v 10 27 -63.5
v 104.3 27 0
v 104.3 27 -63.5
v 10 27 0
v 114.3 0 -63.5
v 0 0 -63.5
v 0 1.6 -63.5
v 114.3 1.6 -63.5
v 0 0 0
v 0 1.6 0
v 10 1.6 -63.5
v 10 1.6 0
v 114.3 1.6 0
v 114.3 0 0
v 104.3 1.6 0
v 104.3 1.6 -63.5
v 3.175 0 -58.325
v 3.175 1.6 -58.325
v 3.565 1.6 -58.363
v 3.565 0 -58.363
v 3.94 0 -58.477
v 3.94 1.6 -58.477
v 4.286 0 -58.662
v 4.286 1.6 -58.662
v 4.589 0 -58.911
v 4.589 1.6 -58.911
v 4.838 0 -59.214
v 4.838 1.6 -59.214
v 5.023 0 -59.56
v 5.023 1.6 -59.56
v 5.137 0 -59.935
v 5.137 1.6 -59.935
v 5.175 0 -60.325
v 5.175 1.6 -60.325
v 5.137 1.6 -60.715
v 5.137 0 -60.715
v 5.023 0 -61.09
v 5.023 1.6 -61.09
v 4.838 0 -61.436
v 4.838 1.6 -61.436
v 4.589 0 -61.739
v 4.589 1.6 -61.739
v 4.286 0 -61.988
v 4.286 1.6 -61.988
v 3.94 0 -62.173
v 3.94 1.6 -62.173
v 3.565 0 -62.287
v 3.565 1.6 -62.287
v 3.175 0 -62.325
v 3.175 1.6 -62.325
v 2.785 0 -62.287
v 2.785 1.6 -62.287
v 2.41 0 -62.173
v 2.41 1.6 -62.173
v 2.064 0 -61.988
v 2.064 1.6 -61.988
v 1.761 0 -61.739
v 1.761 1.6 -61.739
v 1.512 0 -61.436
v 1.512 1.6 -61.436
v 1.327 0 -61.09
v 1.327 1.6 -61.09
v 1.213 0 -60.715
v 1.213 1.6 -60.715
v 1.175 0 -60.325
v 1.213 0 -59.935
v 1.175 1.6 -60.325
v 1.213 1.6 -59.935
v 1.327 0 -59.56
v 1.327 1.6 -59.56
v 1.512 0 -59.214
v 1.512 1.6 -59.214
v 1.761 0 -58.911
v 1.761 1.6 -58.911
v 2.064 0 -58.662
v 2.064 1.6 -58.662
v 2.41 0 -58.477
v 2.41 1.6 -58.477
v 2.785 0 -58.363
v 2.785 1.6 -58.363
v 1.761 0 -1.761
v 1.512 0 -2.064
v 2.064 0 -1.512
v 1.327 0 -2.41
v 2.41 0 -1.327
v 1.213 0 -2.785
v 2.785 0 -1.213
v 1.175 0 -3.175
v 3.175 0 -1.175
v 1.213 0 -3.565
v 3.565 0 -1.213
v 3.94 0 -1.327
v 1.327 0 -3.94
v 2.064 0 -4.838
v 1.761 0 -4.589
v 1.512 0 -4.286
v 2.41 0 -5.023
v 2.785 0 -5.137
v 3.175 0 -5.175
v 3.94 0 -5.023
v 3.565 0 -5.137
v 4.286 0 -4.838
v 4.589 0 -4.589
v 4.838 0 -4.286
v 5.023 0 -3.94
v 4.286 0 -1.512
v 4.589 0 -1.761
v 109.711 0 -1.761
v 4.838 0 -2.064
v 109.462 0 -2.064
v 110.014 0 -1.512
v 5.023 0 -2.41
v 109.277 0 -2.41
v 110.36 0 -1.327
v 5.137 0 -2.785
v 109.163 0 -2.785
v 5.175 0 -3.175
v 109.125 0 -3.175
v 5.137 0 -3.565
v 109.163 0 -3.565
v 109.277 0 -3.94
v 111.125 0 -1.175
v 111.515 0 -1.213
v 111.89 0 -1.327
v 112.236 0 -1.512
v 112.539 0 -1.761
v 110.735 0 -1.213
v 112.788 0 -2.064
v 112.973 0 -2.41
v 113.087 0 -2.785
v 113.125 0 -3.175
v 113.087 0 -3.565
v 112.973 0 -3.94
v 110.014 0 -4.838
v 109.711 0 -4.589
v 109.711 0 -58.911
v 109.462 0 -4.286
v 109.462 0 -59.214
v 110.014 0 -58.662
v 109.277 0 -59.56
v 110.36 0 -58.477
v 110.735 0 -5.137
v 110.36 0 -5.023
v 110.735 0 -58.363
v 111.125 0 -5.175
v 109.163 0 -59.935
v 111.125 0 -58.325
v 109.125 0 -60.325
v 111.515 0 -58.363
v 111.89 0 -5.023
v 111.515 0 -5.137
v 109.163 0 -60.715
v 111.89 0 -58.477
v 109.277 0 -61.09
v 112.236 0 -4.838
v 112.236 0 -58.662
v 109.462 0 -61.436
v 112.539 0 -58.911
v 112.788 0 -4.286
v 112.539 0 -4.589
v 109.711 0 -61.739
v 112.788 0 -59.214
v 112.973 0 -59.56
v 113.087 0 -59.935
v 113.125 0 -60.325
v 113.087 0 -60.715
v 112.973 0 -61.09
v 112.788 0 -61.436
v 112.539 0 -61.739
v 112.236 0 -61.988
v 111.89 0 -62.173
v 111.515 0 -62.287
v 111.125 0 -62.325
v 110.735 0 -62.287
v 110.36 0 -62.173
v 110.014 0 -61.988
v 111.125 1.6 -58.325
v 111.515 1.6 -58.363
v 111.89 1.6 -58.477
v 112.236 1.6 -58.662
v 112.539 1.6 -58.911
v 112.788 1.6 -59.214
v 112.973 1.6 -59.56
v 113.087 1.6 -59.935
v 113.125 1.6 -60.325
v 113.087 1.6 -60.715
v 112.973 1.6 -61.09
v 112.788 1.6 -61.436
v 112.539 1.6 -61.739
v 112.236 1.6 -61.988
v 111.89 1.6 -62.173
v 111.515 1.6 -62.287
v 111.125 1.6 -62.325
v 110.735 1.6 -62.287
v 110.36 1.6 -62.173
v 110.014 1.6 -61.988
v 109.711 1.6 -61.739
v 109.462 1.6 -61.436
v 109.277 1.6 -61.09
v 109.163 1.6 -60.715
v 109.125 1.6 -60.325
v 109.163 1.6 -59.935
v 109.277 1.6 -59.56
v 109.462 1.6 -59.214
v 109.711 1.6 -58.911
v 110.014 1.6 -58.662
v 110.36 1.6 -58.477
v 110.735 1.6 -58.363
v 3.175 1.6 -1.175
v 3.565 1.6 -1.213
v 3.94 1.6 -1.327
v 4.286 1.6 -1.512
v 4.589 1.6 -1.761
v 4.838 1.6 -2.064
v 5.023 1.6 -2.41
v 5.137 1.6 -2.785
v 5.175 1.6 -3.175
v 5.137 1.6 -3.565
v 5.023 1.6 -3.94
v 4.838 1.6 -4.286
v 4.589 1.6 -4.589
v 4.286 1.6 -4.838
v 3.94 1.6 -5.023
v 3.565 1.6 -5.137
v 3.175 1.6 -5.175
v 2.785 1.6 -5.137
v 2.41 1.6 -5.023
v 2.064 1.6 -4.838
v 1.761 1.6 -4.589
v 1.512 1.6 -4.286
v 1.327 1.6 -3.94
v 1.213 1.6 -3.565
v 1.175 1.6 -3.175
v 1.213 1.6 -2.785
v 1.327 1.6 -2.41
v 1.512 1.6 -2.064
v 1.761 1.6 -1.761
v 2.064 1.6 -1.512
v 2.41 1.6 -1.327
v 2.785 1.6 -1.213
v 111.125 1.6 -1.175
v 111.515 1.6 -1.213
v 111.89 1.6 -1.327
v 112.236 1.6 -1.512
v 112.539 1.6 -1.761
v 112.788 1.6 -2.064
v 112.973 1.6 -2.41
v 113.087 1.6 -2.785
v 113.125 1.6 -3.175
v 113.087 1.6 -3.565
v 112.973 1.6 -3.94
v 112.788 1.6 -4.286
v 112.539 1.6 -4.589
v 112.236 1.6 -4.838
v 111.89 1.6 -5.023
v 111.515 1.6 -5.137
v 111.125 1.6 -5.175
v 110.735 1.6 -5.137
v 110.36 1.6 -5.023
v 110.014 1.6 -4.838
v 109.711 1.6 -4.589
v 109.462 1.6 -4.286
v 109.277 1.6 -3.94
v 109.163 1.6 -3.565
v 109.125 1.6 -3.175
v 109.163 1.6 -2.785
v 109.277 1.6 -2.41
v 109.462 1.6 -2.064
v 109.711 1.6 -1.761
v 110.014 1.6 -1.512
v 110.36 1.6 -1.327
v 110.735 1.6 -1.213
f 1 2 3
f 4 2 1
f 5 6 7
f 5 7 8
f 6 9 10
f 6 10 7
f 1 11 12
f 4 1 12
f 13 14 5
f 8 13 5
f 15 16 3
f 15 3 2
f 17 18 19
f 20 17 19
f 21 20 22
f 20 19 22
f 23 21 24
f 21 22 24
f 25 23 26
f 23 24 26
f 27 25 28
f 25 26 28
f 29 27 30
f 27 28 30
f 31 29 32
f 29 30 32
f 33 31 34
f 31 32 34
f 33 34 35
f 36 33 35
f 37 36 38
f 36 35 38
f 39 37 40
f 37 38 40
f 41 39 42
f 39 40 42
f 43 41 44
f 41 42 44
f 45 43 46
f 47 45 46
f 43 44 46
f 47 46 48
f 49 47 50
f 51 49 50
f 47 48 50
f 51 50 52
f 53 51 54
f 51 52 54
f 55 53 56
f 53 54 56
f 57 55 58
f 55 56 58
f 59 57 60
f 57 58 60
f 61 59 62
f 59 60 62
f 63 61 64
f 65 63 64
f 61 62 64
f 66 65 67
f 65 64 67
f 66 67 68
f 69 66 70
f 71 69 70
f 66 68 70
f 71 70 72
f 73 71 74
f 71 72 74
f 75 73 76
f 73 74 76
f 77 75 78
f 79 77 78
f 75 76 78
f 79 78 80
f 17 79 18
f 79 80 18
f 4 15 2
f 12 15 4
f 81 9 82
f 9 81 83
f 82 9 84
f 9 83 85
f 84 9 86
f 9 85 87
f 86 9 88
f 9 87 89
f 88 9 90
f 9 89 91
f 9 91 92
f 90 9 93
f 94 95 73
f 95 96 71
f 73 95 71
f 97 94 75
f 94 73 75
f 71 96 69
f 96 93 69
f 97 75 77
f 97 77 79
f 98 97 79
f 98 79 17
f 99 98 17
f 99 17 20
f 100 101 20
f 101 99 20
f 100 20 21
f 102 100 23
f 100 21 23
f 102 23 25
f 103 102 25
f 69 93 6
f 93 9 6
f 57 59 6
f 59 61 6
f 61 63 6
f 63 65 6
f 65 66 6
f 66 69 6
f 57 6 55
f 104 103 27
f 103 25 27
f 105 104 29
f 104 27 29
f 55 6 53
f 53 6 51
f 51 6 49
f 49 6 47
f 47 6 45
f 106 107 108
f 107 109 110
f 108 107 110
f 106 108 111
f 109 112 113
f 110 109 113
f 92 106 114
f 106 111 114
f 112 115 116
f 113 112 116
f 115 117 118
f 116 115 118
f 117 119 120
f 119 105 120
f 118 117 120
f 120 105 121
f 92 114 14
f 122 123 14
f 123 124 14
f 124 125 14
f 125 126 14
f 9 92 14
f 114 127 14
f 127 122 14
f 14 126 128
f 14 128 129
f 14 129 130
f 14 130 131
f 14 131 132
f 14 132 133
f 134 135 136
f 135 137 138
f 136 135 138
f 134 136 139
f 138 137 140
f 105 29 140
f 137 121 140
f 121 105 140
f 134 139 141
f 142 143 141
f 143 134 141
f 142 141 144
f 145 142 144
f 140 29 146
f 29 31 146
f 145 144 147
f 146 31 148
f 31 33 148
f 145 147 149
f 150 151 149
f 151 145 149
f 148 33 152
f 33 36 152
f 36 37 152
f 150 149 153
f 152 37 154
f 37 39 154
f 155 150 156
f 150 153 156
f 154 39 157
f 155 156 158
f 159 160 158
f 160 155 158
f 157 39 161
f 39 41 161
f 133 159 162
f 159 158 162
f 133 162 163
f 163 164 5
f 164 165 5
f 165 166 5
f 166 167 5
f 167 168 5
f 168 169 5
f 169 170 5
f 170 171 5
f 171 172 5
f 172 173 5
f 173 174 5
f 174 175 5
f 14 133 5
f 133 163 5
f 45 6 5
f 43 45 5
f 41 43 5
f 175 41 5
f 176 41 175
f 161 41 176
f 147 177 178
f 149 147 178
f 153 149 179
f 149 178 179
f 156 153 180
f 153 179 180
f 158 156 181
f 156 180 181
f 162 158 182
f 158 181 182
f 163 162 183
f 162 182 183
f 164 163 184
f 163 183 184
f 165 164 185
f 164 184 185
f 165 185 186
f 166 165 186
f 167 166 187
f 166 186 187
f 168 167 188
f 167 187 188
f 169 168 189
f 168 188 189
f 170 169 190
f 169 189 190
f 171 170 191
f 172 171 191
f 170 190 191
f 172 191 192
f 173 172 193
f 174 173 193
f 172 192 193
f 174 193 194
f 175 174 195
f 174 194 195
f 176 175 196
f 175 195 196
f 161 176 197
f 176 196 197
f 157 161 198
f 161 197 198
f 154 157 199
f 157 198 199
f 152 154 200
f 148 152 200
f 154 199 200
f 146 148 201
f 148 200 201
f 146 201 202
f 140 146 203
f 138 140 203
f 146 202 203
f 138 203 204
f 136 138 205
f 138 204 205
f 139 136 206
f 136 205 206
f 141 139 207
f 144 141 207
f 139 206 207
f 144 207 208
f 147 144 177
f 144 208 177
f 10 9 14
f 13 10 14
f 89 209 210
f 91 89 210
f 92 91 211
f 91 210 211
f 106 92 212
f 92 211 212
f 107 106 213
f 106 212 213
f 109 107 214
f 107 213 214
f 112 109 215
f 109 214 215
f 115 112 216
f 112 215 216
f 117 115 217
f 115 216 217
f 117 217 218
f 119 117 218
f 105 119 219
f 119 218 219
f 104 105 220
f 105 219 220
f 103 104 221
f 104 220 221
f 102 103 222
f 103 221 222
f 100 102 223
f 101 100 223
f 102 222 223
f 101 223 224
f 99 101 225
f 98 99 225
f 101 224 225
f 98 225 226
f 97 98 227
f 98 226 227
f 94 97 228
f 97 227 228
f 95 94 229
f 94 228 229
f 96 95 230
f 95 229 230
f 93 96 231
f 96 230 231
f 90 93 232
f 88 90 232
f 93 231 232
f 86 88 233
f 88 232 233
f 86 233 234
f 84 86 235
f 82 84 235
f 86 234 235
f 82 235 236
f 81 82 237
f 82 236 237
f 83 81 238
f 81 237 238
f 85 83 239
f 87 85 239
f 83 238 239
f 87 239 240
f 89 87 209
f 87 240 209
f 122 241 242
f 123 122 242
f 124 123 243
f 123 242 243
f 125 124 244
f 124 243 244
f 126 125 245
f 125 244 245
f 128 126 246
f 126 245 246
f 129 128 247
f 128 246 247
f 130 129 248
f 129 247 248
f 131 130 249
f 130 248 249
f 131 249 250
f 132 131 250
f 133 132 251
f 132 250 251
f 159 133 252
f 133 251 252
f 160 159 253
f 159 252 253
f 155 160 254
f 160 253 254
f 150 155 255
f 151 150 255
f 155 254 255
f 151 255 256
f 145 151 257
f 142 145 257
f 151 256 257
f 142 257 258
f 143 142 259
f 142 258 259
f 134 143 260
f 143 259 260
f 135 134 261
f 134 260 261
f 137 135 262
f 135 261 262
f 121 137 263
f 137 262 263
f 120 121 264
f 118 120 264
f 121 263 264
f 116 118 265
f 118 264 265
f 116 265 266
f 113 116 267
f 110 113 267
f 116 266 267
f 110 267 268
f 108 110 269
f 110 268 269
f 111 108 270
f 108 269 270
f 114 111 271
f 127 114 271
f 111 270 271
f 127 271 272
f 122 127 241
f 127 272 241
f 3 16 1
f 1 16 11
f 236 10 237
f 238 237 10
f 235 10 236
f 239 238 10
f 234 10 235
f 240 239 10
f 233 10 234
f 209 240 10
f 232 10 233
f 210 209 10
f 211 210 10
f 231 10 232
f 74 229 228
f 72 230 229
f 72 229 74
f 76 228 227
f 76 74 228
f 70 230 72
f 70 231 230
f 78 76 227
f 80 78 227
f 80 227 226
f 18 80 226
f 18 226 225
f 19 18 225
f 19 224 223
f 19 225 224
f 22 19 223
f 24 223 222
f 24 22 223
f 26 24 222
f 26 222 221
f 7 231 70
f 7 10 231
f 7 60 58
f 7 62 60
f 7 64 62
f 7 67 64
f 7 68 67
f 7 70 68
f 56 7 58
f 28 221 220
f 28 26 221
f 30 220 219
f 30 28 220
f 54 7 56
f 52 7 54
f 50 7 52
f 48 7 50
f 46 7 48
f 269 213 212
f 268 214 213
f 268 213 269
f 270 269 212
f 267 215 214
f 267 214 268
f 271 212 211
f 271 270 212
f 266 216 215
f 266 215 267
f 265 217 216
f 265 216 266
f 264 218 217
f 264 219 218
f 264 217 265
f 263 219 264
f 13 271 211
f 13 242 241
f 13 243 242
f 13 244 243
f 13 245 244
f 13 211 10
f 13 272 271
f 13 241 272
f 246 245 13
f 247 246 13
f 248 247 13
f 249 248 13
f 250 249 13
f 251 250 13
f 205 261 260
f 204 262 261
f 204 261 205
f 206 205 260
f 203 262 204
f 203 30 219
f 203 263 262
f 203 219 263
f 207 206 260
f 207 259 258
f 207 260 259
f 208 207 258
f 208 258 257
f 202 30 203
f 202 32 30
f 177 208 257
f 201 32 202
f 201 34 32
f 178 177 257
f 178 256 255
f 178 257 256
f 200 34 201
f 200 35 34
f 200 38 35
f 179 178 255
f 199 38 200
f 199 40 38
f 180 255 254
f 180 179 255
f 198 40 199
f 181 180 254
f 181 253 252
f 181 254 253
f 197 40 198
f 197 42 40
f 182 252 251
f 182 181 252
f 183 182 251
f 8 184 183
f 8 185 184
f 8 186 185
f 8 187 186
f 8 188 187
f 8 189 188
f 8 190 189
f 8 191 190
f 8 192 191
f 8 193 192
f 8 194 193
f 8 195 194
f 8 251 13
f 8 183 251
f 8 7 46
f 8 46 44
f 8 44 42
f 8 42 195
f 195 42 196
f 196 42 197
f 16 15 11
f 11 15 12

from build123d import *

# Parameters (mm, degrees)
ESQUISSE1_W             = 114.3
ESQUISSE1_H             = 63.5
EXTRUSION1_DEPTH        = 1.6
ESQUISSE2_R             = 2
ENL_V_MAT_EXTRU_1_DEPTH = 1.6
ESQUISSE4_W             = 94.3
ESQUISSE4_H             = 63.5
EXTRUSION4_DEPTH        = 25.4


with BuildPart() as part:
    # Esquisse1 → Extrusion1 (new body)
    with BuildSketch(Plane(origin=(0, 0, 0), x_dir=(1, 0, 0), z_dir=(0, 1, 0))):
        with Locations((57.15, 31.75)):
            Rectangle(ESQUISSE1_W, ESQUISSE1_H)
    extrude(amount=EXTRUSION1_DEPTH)

    # Esquisse2 → Enlèv. mat.-Extru.1 (cut)
    with BuildSketch(Plane(origin=(0, 1.6, 0), x_dir=(-1, 0, 0), z_dir=(0, 1, 0))):
        with Locations(Location((-3.175, -60.325, 0), (0, 0, 90))):
            Circle(ESQUISSE2_R)
        with Locations(Location((-3.175, -3.175, 0), (0, 0, 90))):
            Circle(ESQUISSE2_R)
        with Locations(Location((-111.125, -60.325, 0), (0, 0, 90))):
            Circle(ESQUISSE2_R)
        with Locations(Location((-111.125, -3.175, 0), (0, 0, 90))):
            Circle(ESQUISSE2_R)
    extrude(amount=-ENL_V_MAT_EXTRU_1_DEPTH, mode=Mode.SUBTRACT)


with BuildPart() as body_2:
    # Esquisse4 → Extrusion4 (new body)
    with BuildSketch(Plane(origin=(0, 1.6, 0), x_dir=(-1, 0, 0), z_dir=(0, 1, 0))):
        with Locations((-57.15, -31.75)):
            Rectangle(ESQUISSE4_W, ESQUISSE4_H)
    extrude(amount=EXTRUSION4_DEPTH)


solid = Compound([part.part, body_2.part])
